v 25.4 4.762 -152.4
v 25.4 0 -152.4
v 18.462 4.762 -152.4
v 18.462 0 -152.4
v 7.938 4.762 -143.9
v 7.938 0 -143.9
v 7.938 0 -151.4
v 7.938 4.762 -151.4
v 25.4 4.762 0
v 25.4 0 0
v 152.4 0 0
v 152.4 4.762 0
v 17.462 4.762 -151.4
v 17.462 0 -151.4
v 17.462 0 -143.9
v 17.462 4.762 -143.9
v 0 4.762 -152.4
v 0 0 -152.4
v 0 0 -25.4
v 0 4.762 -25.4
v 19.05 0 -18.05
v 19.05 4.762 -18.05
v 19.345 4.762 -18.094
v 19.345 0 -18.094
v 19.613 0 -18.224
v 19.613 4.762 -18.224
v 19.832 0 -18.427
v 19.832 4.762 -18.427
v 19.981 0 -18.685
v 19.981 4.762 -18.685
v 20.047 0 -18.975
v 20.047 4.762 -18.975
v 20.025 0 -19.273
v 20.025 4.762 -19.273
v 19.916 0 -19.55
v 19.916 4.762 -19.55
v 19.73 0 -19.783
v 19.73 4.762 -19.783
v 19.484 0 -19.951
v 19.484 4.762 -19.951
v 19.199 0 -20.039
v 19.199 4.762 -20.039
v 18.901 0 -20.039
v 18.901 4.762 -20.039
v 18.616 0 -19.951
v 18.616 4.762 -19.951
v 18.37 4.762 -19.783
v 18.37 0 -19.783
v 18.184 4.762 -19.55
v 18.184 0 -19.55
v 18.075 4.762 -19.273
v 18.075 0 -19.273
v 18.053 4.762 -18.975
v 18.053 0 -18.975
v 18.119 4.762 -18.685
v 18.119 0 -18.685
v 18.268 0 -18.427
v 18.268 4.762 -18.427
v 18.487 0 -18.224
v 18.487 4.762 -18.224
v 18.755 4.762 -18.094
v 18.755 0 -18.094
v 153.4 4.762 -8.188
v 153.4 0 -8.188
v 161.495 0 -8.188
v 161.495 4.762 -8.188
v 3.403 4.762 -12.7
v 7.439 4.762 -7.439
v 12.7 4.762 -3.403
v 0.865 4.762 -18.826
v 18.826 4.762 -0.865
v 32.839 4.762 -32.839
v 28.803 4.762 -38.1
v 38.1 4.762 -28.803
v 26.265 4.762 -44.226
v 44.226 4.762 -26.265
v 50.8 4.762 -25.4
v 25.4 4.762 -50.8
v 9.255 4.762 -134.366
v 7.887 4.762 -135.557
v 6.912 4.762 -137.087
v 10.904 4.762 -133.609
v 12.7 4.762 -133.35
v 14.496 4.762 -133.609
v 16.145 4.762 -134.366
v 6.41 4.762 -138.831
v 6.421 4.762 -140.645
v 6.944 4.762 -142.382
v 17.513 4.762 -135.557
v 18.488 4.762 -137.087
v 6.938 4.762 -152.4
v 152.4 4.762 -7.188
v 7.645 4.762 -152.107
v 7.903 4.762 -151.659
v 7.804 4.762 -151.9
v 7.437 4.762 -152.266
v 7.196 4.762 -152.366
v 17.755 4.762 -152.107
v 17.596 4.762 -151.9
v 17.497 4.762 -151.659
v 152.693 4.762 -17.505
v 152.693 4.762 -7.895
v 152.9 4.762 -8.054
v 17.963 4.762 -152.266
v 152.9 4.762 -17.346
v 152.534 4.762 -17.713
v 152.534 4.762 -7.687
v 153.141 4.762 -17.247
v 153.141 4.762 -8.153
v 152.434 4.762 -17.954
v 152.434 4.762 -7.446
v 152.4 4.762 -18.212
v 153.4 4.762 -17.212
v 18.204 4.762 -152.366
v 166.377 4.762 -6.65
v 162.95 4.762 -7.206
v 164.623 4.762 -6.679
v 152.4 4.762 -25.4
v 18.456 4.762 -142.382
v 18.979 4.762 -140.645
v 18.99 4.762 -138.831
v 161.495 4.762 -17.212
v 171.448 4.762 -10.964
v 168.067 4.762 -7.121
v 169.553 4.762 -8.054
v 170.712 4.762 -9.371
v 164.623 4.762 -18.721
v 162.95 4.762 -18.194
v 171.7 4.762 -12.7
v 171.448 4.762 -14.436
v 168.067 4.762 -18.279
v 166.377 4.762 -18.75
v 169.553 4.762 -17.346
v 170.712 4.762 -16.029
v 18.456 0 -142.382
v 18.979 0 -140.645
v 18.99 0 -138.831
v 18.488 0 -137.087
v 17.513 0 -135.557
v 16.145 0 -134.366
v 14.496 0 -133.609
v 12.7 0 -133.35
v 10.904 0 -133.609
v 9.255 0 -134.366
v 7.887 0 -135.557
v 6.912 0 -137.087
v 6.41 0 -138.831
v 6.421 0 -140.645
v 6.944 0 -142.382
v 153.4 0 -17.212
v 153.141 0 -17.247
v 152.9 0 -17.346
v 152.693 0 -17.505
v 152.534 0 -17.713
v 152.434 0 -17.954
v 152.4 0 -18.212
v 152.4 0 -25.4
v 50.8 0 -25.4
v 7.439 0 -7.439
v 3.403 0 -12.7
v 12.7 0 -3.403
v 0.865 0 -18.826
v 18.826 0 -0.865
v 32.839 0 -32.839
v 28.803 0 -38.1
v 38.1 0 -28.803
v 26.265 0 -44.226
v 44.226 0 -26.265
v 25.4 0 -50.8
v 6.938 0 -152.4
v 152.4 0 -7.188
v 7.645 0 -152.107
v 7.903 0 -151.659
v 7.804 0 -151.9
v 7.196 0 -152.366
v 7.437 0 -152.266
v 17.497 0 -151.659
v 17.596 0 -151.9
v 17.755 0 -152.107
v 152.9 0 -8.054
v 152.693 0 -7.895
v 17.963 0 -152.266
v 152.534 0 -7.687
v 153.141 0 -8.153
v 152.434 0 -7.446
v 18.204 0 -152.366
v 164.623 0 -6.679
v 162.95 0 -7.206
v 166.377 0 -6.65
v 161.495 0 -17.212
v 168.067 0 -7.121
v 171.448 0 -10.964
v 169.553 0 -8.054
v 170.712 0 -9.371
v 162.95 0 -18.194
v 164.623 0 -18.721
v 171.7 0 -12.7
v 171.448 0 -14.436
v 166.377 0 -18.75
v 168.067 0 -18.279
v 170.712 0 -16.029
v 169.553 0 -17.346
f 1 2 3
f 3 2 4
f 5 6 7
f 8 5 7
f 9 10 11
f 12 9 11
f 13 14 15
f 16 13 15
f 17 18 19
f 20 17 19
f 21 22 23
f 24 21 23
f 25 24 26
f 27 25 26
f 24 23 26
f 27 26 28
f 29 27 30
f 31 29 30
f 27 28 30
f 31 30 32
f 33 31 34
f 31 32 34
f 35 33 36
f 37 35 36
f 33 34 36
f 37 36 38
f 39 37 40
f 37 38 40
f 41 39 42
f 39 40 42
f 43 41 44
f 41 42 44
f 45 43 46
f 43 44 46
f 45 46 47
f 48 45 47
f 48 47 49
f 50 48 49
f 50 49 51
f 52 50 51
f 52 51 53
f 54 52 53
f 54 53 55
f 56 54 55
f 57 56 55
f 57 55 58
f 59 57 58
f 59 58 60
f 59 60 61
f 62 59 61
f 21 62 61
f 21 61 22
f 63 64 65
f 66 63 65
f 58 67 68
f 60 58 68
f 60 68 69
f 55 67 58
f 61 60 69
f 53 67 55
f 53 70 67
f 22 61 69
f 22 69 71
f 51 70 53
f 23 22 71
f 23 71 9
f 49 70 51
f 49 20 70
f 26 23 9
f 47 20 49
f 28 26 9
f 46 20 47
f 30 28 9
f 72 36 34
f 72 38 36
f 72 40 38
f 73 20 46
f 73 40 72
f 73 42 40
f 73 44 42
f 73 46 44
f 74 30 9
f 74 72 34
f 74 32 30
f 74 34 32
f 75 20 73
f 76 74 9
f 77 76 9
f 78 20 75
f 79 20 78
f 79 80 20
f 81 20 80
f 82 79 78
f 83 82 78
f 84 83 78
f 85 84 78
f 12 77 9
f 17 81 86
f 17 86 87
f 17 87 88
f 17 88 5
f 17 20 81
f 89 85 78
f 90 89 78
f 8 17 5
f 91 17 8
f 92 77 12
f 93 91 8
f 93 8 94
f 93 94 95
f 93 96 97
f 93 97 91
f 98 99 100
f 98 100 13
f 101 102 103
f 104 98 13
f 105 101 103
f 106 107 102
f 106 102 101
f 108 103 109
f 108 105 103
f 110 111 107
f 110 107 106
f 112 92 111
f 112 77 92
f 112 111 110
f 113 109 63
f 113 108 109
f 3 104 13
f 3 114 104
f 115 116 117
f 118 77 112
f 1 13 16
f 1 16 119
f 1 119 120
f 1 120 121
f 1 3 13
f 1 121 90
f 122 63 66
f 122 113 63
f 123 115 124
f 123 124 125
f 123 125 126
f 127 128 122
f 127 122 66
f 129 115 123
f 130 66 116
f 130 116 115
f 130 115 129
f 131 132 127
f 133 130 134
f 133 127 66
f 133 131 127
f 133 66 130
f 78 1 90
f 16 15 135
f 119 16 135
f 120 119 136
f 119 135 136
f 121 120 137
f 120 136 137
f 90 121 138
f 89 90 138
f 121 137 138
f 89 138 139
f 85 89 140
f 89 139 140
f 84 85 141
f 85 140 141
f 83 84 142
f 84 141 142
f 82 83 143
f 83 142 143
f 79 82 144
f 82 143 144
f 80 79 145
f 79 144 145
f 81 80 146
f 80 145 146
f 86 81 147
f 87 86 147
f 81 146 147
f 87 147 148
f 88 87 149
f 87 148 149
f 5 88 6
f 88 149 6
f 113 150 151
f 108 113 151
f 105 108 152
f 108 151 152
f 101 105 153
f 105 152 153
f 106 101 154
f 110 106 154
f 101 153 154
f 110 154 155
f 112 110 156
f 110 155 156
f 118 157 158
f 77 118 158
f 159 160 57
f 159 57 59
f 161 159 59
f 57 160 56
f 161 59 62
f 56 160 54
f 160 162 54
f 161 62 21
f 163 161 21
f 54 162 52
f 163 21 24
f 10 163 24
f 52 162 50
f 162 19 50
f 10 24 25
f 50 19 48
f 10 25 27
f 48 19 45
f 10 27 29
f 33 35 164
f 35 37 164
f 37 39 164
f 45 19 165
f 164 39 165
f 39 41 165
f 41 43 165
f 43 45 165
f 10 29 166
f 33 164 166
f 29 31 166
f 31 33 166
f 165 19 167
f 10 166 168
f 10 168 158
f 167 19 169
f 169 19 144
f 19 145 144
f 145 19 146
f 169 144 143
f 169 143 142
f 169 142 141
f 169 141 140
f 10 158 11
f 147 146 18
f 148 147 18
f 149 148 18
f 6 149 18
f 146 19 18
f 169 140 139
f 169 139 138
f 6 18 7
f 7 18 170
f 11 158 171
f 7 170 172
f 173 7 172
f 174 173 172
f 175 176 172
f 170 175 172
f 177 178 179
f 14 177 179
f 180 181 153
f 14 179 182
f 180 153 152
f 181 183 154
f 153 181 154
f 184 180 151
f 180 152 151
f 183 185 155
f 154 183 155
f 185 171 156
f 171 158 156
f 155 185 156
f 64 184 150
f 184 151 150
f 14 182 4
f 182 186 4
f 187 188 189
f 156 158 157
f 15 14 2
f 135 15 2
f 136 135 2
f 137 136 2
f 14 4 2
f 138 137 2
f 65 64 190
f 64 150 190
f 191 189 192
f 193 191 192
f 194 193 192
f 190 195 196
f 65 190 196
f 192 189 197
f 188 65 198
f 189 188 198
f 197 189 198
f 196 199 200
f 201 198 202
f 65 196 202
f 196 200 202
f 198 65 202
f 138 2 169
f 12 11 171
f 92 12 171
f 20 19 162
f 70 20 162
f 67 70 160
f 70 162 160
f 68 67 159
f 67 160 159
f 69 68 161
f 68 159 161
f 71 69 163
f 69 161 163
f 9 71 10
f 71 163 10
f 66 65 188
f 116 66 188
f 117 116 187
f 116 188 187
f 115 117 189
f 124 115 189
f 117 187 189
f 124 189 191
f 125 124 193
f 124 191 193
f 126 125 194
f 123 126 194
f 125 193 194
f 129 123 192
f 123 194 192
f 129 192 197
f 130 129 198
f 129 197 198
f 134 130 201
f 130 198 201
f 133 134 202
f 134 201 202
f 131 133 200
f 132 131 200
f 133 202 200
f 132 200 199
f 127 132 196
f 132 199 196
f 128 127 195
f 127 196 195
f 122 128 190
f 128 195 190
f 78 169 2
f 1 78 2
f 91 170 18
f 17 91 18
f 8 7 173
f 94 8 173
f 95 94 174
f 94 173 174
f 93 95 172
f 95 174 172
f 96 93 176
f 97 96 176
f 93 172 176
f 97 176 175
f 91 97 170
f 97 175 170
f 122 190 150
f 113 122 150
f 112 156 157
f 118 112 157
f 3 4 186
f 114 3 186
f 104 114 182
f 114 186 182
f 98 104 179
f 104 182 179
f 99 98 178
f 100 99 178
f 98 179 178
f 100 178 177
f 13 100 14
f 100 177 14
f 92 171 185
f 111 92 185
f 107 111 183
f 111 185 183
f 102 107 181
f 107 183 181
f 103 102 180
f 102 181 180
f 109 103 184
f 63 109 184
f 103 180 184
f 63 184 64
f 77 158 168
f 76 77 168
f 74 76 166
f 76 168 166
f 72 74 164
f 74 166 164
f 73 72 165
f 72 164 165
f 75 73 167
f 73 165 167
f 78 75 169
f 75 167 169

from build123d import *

# Parameters (mm, degrees)
BOSS_EXTRUDE1_DEPTH = 4.7625
SKETCH2_R           = 1
CUT_EXTRUDE1_DEPTH  = 8.89


with BuildPart() as part:
    # Sketch1 → Boss-Extrude1 (new body)
    with BuildSketch(Plane(origin=(0, 0, 0), x_dir=(1, 0, 0), z_dir=(0, 1, 0))):
        with BuildLine():
            Line((25.4, 0), (152.4, 0))
            Line((152.4, 0), (152.4, 7.1875))
            ThreePointArc((152.4, 7.1875), (152.692893219, 7.894606781), (153.4, 8.1875))
            Line((153.4, 8.1875), (161.495448411, 8.1875))
            ThreePointArc((161.495448411, 8.1875), (171.7, 12.7), (161.495448411, 17.2125))
            Line((161.495448411, 17.2125), (153.4, 17.2125))
            ThreePointArc((153.4, 17.2125), (152.692893219, 17.505393219), (152.4, 18.2125))
            Line((152.4, 18.2125), (152.4, 25.4))
            Line((152.4, 25.4), (50.8, 25.4))
            ThreePointArc((50.8, 25.4), (32.839487758, 32.839487758), (25.4, 50.8))
            Line((25.4, 50.8), (25.4, 152.4))
            Line((25.4, 152.4), (18.4625, 152.4))
            ThreePointArc((18.4625, 152.4), (17.755393219, 152.107106781), (17.4625, 151.4))
            Line((17.4625, 151.4), (17.4625, 143.900130206))
            ThreePointArc((17.4625, 143.900130206), (12.7, 133.35), (7.9375, 143.900130206))
            Line((7.9375, 143.900130206), (7.9375, 151.4))
            ThreePointArc((7.9375, 151.4), (7.644606781, 152.107106781), (6.9375, 152.4))
            Line((6.9375, 152.4), (0, 152.4))
            Line((0, 152.4), (0, 25.4))
            ThreePointArc((0, 25.4), (7.439487758, 7.439487758), (25.4, 0))
        make_face()
    extrude(amount=BOSS_EXTRUDE1_DEPTH)

    # Sketch2 → Cut-Extrude1 (cut)
    with BuildSketch(Plane(origin=(0, 4.7625, 0), x_dir=(1, 0, 0), z_dir=(0, 1, 0))):
        with Locations(Location((19.05, 19.05, 0), (0, 0, 270))):
            Circle(SKETCH2_R)
    extrude(amount=-CUT_EXTRUDE1_DEPTH, mode=Mode.SUBTRACT)


solid = part.part
